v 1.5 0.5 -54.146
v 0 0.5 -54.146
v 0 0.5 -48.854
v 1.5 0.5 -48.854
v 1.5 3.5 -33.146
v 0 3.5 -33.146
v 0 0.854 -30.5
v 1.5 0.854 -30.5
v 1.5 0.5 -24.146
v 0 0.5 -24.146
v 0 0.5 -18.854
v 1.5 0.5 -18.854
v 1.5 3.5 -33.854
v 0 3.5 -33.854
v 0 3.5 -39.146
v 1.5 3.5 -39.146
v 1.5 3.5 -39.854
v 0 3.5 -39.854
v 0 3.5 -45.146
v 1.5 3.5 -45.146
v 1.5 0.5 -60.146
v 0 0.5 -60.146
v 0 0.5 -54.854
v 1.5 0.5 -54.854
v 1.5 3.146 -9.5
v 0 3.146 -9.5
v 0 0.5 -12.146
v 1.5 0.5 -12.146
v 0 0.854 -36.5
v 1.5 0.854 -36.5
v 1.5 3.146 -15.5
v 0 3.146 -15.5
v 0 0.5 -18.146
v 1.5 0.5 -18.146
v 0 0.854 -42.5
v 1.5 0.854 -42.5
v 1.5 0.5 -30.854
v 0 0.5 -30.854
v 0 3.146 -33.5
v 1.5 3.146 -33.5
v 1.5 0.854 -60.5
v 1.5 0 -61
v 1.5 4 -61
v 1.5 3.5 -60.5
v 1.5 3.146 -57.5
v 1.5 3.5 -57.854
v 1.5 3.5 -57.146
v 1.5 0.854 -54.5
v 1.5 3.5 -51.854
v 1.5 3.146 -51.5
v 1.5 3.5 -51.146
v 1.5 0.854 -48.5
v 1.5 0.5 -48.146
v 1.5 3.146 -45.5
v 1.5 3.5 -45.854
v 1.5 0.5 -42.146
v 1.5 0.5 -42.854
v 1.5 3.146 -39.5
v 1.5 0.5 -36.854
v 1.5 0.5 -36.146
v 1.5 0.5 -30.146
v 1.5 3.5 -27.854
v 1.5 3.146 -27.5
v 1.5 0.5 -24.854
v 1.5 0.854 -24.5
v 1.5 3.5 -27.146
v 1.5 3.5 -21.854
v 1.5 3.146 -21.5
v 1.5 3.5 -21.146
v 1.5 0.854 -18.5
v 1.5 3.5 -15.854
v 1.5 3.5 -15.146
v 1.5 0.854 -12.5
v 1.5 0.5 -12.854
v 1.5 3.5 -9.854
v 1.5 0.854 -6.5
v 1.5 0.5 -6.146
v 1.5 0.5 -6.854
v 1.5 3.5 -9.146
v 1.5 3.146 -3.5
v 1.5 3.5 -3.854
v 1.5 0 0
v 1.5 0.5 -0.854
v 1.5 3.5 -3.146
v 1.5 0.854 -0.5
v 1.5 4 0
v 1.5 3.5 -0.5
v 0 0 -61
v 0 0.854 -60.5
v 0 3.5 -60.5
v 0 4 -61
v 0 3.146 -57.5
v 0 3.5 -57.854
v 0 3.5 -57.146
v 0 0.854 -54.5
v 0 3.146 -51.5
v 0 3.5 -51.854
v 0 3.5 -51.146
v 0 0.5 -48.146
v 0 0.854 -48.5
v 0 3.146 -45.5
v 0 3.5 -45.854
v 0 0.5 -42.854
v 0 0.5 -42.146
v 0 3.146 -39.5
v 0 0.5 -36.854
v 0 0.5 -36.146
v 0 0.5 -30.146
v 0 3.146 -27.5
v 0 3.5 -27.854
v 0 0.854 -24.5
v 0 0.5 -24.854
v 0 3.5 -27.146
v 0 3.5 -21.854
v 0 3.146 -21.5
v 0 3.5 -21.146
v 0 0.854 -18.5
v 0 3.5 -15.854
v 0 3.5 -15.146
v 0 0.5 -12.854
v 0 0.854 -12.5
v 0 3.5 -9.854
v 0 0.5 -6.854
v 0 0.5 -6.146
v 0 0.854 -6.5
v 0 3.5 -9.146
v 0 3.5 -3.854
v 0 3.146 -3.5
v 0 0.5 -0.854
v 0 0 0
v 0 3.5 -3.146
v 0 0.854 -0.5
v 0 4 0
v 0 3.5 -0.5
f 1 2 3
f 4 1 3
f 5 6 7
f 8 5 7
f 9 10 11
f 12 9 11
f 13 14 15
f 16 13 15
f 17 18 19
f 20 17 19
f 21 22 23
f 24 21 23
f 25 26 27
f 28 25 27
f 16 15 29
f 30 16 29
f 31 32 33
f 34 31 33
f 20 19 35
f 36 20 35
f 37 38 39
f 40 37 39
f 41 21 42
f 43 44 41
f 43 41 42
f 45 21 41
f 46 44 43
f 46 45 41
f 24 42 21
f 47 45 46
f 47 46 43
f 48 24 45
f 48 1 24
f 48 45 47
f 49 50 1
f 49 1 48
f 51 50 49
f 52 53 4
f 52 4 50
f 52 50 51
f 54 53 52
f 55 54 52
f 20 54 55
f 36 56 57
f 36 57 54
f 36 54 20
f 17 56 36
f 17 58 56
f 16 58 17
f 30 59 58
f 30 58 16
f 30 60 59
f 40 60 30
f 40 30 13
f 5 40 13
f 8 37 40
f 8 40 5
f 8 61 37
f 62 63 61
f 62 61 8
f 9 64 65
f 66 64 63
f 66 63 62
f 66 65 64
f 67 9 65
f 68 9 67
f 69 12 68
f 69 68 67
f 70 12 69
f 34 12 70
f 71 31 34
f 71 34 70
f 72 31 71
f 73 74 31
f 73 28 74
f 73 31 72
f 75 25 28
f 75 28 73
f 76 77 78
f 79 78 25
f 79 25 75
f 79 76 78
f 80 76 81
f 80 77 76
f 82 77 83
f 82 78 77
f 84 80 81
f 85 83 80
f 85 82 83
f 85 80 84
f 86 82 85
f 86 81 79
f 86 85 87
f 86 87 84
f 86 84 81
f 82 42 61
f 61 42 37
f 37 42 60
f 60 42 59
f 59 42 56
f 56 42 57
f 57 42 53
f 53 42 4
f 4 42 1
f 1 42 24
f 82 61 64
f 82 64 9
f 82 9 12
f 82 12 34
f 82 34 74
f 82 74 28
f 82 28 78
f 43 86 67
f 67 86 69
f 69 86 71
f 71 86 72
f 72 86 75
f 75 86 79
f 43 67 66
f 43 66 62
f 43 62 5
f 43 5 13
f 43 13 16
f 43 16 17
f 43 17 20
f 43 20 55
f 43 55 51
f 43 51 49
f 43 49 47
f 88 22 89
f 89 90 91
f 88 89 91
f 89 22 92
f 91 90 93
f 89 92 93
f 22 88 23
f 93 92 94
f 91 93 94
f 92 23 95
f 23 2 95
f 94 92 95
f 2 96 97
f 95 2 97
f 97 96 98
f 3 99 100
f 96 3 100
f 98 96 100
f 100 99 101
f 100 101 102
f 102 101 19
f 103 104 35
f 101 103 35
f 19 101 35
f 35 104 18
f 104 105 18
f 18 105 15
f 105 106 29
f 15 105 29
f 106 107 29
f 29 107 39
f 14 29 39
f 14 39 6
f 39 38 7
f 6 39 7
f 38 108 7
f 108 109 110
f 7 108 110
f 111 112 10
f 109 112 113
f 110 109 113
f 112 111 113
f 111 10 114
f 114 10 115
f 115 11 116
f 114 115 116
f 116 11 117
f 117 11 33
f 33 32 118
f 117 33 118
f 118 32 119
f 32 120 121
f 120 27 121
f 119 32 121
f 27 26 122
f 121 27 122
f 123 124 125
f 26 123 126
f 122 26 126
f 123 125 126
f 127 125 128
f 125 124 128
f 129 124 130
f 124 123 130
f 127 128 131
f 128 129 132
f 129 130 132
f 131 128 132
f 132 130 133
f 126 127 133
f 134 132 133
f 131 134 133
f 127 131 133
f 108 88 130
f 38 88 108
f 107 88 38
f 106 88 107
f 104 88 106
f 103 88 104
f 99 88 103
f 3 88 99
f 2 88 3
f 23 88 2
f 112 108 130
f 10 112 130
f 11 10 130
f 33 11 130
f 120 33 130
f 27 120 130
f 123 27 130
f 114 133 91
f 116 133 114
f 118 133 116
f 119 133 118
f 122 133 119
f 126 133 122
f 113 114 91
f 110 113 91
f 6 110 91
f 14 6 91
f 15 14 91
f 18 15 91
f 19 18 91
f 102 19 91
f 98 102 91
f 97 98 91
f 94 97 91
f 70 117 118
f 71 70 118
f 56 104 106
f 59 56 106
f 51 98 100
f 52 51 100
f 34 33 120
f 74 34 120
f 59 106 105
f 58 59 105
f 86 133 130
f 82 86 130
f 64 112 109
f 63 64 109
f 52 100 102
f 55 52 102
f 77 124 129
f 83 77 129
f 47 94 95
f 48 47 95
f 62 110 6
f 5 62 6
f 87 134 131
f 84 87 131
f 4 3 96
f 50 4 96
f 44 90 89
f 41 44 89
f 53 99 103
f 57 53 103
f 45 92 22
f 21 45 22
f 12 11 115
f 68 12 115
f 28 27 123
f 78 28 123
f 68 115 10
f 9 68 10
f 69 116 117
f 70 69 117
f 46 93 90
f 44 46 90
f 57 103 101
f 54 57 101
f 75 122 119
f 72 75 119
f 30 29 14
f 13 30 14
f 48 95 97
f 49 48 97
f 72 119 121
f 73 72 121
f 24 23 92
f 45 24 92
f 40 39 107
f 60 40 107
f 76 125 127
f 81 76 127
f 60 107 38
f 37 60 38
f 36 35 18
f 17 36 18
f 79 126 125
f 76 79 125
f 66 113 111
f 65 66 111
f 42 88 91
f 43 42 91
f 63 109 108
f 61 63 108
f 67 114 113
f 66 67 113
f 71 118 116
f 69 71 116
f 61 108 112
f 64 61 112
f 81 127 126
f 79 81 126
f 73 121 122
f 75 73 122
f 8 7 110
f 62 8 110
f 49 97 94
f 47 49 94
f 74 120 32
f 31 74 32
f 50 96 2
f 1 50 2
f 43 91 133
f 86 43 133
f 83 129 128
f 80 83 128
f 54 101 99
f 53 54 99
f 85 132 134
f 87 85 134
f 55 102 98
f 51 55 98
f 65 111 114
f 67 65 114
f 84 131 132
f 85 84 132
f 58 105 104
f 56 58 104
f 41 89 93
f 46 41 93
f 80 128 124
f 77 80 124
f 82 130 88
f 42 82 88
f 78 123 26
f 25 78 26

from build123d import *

# Parameters (mm, degrees)
F1_DEPTH = 1.5


with BuildPart() as f1:
    # F0 (on Right) → F1 (new body)
    with BuildSketch(Plane.YZ):
        Polygon((4, 0), (0, 0), (0, -60), (0, -61), (0.353553, -61), (4, -61), (4, -60), align=None)
        Polygon((0.5, -54.853553), (3.146447, -57.5), (0.5, -60.146447), (0.5, -59.5), align=None, mode=Mode.SUBTRACT)
        Polygon((0.5, -48.853553), (3.146447, -51.5), (0.5, -54.146447), align=None, mode=Mode.SUBTRACT)
        Polygon((0.5, -42.853553), (3.146447, -45.5), (0.5, -48.146447), align=None, mode=Mode.SUBTRACT)
        Polygon((0.5, -36.853553), (3.146447, -39.5), (0.5, -42.146447), align=None, mode=Mode.SUBTRACT)
        Polygon((0.5, -30.853553), (3.146447, -33.5), (0.5, -36.146447), align=None, mode=Mode.SUBTRACT)
        Polygon((0.853553, -60.5), (3.5, -57.853553), (3.5, -59.5), (3.5, -60.5), align=None, mode=Mode.SUBTRACT)
        Polygon((3.5, -57.146447), (0.853553, -54.5), (3.5, -51.853553), align=None, mode=Mode.SUBTRACT)
        Polygon((3.5, -51.146447), (0.853553, -48.5), (3.5, -45.853553), align=None, mode=Mode.SUBTRACT)
        Polygon((3.5, -45.146447), (0.853553, -42.5), (3.5, -39.853553), align=None, mode=Mode.SUBTRACT)
        Polygon((3.5, -39.146447), (0.853553, -36.5), (3.5, -33.853553), align=None, mode=Mode.SUBTRACT)
        Polygon((3.5, -33.146447), (0.853553, -30.5), (3.5, -27.853553), align=None, mode=Mode.SUBTRACT)
        Polygon((0.5, -24.853553), (3.146447, -27.5), (0.5, -30.146447), align=None, mode=Mode.SUBTRACT)
        Polygon((0.5, -18.853553), (3.146447, -21.5), (0.5, -24.146447), align=None, mode=Mode.SUBTRACT)
        Polygon((0.5, -12.853553), (3.146447, -15.5), (0.5, -18.146447), align=None, mode=Mode.SUBTRACT)
        Polygon((0.5, -6.853553), (3.146447, -9.5), (0.5, -12.146447), align=None, mode=Mode.SUBTRACT)
        Polygon((0.5, -6.146447), (0.5, -0.853553), (3.146447, -3.5), align=None, mode=Mode.SUBTRACT)
        Polygon((3.5, -27.146447), (0.853553, -24.5), (3.5, -21.853553), align=None, mode=Mode.SUBTRACT)
        Polygon((3.5, -21.146447), (0.853553, -18.5), (3.5, -15.853553), align=None, mode=Mode.SUBTRACT)
        Polygon((3.5, -15.146447), (0.853553, -12.5), (3.5, -9.853553), align=None, mode=Mode.SUBTRACT)
        Polygon((0.853553, -6.5), (3.5, -3.853553), (3.5, -9.146447), align=None, mode=Mode.SUBTRACT)
        Polygon((0.853553, -0.5), (3.5, -0.5), (3.5, -3.146447), align=None, mode=Mode.SUBTRACT)
    extrude(amount=F1_DEPTH)


solid = f1.part
